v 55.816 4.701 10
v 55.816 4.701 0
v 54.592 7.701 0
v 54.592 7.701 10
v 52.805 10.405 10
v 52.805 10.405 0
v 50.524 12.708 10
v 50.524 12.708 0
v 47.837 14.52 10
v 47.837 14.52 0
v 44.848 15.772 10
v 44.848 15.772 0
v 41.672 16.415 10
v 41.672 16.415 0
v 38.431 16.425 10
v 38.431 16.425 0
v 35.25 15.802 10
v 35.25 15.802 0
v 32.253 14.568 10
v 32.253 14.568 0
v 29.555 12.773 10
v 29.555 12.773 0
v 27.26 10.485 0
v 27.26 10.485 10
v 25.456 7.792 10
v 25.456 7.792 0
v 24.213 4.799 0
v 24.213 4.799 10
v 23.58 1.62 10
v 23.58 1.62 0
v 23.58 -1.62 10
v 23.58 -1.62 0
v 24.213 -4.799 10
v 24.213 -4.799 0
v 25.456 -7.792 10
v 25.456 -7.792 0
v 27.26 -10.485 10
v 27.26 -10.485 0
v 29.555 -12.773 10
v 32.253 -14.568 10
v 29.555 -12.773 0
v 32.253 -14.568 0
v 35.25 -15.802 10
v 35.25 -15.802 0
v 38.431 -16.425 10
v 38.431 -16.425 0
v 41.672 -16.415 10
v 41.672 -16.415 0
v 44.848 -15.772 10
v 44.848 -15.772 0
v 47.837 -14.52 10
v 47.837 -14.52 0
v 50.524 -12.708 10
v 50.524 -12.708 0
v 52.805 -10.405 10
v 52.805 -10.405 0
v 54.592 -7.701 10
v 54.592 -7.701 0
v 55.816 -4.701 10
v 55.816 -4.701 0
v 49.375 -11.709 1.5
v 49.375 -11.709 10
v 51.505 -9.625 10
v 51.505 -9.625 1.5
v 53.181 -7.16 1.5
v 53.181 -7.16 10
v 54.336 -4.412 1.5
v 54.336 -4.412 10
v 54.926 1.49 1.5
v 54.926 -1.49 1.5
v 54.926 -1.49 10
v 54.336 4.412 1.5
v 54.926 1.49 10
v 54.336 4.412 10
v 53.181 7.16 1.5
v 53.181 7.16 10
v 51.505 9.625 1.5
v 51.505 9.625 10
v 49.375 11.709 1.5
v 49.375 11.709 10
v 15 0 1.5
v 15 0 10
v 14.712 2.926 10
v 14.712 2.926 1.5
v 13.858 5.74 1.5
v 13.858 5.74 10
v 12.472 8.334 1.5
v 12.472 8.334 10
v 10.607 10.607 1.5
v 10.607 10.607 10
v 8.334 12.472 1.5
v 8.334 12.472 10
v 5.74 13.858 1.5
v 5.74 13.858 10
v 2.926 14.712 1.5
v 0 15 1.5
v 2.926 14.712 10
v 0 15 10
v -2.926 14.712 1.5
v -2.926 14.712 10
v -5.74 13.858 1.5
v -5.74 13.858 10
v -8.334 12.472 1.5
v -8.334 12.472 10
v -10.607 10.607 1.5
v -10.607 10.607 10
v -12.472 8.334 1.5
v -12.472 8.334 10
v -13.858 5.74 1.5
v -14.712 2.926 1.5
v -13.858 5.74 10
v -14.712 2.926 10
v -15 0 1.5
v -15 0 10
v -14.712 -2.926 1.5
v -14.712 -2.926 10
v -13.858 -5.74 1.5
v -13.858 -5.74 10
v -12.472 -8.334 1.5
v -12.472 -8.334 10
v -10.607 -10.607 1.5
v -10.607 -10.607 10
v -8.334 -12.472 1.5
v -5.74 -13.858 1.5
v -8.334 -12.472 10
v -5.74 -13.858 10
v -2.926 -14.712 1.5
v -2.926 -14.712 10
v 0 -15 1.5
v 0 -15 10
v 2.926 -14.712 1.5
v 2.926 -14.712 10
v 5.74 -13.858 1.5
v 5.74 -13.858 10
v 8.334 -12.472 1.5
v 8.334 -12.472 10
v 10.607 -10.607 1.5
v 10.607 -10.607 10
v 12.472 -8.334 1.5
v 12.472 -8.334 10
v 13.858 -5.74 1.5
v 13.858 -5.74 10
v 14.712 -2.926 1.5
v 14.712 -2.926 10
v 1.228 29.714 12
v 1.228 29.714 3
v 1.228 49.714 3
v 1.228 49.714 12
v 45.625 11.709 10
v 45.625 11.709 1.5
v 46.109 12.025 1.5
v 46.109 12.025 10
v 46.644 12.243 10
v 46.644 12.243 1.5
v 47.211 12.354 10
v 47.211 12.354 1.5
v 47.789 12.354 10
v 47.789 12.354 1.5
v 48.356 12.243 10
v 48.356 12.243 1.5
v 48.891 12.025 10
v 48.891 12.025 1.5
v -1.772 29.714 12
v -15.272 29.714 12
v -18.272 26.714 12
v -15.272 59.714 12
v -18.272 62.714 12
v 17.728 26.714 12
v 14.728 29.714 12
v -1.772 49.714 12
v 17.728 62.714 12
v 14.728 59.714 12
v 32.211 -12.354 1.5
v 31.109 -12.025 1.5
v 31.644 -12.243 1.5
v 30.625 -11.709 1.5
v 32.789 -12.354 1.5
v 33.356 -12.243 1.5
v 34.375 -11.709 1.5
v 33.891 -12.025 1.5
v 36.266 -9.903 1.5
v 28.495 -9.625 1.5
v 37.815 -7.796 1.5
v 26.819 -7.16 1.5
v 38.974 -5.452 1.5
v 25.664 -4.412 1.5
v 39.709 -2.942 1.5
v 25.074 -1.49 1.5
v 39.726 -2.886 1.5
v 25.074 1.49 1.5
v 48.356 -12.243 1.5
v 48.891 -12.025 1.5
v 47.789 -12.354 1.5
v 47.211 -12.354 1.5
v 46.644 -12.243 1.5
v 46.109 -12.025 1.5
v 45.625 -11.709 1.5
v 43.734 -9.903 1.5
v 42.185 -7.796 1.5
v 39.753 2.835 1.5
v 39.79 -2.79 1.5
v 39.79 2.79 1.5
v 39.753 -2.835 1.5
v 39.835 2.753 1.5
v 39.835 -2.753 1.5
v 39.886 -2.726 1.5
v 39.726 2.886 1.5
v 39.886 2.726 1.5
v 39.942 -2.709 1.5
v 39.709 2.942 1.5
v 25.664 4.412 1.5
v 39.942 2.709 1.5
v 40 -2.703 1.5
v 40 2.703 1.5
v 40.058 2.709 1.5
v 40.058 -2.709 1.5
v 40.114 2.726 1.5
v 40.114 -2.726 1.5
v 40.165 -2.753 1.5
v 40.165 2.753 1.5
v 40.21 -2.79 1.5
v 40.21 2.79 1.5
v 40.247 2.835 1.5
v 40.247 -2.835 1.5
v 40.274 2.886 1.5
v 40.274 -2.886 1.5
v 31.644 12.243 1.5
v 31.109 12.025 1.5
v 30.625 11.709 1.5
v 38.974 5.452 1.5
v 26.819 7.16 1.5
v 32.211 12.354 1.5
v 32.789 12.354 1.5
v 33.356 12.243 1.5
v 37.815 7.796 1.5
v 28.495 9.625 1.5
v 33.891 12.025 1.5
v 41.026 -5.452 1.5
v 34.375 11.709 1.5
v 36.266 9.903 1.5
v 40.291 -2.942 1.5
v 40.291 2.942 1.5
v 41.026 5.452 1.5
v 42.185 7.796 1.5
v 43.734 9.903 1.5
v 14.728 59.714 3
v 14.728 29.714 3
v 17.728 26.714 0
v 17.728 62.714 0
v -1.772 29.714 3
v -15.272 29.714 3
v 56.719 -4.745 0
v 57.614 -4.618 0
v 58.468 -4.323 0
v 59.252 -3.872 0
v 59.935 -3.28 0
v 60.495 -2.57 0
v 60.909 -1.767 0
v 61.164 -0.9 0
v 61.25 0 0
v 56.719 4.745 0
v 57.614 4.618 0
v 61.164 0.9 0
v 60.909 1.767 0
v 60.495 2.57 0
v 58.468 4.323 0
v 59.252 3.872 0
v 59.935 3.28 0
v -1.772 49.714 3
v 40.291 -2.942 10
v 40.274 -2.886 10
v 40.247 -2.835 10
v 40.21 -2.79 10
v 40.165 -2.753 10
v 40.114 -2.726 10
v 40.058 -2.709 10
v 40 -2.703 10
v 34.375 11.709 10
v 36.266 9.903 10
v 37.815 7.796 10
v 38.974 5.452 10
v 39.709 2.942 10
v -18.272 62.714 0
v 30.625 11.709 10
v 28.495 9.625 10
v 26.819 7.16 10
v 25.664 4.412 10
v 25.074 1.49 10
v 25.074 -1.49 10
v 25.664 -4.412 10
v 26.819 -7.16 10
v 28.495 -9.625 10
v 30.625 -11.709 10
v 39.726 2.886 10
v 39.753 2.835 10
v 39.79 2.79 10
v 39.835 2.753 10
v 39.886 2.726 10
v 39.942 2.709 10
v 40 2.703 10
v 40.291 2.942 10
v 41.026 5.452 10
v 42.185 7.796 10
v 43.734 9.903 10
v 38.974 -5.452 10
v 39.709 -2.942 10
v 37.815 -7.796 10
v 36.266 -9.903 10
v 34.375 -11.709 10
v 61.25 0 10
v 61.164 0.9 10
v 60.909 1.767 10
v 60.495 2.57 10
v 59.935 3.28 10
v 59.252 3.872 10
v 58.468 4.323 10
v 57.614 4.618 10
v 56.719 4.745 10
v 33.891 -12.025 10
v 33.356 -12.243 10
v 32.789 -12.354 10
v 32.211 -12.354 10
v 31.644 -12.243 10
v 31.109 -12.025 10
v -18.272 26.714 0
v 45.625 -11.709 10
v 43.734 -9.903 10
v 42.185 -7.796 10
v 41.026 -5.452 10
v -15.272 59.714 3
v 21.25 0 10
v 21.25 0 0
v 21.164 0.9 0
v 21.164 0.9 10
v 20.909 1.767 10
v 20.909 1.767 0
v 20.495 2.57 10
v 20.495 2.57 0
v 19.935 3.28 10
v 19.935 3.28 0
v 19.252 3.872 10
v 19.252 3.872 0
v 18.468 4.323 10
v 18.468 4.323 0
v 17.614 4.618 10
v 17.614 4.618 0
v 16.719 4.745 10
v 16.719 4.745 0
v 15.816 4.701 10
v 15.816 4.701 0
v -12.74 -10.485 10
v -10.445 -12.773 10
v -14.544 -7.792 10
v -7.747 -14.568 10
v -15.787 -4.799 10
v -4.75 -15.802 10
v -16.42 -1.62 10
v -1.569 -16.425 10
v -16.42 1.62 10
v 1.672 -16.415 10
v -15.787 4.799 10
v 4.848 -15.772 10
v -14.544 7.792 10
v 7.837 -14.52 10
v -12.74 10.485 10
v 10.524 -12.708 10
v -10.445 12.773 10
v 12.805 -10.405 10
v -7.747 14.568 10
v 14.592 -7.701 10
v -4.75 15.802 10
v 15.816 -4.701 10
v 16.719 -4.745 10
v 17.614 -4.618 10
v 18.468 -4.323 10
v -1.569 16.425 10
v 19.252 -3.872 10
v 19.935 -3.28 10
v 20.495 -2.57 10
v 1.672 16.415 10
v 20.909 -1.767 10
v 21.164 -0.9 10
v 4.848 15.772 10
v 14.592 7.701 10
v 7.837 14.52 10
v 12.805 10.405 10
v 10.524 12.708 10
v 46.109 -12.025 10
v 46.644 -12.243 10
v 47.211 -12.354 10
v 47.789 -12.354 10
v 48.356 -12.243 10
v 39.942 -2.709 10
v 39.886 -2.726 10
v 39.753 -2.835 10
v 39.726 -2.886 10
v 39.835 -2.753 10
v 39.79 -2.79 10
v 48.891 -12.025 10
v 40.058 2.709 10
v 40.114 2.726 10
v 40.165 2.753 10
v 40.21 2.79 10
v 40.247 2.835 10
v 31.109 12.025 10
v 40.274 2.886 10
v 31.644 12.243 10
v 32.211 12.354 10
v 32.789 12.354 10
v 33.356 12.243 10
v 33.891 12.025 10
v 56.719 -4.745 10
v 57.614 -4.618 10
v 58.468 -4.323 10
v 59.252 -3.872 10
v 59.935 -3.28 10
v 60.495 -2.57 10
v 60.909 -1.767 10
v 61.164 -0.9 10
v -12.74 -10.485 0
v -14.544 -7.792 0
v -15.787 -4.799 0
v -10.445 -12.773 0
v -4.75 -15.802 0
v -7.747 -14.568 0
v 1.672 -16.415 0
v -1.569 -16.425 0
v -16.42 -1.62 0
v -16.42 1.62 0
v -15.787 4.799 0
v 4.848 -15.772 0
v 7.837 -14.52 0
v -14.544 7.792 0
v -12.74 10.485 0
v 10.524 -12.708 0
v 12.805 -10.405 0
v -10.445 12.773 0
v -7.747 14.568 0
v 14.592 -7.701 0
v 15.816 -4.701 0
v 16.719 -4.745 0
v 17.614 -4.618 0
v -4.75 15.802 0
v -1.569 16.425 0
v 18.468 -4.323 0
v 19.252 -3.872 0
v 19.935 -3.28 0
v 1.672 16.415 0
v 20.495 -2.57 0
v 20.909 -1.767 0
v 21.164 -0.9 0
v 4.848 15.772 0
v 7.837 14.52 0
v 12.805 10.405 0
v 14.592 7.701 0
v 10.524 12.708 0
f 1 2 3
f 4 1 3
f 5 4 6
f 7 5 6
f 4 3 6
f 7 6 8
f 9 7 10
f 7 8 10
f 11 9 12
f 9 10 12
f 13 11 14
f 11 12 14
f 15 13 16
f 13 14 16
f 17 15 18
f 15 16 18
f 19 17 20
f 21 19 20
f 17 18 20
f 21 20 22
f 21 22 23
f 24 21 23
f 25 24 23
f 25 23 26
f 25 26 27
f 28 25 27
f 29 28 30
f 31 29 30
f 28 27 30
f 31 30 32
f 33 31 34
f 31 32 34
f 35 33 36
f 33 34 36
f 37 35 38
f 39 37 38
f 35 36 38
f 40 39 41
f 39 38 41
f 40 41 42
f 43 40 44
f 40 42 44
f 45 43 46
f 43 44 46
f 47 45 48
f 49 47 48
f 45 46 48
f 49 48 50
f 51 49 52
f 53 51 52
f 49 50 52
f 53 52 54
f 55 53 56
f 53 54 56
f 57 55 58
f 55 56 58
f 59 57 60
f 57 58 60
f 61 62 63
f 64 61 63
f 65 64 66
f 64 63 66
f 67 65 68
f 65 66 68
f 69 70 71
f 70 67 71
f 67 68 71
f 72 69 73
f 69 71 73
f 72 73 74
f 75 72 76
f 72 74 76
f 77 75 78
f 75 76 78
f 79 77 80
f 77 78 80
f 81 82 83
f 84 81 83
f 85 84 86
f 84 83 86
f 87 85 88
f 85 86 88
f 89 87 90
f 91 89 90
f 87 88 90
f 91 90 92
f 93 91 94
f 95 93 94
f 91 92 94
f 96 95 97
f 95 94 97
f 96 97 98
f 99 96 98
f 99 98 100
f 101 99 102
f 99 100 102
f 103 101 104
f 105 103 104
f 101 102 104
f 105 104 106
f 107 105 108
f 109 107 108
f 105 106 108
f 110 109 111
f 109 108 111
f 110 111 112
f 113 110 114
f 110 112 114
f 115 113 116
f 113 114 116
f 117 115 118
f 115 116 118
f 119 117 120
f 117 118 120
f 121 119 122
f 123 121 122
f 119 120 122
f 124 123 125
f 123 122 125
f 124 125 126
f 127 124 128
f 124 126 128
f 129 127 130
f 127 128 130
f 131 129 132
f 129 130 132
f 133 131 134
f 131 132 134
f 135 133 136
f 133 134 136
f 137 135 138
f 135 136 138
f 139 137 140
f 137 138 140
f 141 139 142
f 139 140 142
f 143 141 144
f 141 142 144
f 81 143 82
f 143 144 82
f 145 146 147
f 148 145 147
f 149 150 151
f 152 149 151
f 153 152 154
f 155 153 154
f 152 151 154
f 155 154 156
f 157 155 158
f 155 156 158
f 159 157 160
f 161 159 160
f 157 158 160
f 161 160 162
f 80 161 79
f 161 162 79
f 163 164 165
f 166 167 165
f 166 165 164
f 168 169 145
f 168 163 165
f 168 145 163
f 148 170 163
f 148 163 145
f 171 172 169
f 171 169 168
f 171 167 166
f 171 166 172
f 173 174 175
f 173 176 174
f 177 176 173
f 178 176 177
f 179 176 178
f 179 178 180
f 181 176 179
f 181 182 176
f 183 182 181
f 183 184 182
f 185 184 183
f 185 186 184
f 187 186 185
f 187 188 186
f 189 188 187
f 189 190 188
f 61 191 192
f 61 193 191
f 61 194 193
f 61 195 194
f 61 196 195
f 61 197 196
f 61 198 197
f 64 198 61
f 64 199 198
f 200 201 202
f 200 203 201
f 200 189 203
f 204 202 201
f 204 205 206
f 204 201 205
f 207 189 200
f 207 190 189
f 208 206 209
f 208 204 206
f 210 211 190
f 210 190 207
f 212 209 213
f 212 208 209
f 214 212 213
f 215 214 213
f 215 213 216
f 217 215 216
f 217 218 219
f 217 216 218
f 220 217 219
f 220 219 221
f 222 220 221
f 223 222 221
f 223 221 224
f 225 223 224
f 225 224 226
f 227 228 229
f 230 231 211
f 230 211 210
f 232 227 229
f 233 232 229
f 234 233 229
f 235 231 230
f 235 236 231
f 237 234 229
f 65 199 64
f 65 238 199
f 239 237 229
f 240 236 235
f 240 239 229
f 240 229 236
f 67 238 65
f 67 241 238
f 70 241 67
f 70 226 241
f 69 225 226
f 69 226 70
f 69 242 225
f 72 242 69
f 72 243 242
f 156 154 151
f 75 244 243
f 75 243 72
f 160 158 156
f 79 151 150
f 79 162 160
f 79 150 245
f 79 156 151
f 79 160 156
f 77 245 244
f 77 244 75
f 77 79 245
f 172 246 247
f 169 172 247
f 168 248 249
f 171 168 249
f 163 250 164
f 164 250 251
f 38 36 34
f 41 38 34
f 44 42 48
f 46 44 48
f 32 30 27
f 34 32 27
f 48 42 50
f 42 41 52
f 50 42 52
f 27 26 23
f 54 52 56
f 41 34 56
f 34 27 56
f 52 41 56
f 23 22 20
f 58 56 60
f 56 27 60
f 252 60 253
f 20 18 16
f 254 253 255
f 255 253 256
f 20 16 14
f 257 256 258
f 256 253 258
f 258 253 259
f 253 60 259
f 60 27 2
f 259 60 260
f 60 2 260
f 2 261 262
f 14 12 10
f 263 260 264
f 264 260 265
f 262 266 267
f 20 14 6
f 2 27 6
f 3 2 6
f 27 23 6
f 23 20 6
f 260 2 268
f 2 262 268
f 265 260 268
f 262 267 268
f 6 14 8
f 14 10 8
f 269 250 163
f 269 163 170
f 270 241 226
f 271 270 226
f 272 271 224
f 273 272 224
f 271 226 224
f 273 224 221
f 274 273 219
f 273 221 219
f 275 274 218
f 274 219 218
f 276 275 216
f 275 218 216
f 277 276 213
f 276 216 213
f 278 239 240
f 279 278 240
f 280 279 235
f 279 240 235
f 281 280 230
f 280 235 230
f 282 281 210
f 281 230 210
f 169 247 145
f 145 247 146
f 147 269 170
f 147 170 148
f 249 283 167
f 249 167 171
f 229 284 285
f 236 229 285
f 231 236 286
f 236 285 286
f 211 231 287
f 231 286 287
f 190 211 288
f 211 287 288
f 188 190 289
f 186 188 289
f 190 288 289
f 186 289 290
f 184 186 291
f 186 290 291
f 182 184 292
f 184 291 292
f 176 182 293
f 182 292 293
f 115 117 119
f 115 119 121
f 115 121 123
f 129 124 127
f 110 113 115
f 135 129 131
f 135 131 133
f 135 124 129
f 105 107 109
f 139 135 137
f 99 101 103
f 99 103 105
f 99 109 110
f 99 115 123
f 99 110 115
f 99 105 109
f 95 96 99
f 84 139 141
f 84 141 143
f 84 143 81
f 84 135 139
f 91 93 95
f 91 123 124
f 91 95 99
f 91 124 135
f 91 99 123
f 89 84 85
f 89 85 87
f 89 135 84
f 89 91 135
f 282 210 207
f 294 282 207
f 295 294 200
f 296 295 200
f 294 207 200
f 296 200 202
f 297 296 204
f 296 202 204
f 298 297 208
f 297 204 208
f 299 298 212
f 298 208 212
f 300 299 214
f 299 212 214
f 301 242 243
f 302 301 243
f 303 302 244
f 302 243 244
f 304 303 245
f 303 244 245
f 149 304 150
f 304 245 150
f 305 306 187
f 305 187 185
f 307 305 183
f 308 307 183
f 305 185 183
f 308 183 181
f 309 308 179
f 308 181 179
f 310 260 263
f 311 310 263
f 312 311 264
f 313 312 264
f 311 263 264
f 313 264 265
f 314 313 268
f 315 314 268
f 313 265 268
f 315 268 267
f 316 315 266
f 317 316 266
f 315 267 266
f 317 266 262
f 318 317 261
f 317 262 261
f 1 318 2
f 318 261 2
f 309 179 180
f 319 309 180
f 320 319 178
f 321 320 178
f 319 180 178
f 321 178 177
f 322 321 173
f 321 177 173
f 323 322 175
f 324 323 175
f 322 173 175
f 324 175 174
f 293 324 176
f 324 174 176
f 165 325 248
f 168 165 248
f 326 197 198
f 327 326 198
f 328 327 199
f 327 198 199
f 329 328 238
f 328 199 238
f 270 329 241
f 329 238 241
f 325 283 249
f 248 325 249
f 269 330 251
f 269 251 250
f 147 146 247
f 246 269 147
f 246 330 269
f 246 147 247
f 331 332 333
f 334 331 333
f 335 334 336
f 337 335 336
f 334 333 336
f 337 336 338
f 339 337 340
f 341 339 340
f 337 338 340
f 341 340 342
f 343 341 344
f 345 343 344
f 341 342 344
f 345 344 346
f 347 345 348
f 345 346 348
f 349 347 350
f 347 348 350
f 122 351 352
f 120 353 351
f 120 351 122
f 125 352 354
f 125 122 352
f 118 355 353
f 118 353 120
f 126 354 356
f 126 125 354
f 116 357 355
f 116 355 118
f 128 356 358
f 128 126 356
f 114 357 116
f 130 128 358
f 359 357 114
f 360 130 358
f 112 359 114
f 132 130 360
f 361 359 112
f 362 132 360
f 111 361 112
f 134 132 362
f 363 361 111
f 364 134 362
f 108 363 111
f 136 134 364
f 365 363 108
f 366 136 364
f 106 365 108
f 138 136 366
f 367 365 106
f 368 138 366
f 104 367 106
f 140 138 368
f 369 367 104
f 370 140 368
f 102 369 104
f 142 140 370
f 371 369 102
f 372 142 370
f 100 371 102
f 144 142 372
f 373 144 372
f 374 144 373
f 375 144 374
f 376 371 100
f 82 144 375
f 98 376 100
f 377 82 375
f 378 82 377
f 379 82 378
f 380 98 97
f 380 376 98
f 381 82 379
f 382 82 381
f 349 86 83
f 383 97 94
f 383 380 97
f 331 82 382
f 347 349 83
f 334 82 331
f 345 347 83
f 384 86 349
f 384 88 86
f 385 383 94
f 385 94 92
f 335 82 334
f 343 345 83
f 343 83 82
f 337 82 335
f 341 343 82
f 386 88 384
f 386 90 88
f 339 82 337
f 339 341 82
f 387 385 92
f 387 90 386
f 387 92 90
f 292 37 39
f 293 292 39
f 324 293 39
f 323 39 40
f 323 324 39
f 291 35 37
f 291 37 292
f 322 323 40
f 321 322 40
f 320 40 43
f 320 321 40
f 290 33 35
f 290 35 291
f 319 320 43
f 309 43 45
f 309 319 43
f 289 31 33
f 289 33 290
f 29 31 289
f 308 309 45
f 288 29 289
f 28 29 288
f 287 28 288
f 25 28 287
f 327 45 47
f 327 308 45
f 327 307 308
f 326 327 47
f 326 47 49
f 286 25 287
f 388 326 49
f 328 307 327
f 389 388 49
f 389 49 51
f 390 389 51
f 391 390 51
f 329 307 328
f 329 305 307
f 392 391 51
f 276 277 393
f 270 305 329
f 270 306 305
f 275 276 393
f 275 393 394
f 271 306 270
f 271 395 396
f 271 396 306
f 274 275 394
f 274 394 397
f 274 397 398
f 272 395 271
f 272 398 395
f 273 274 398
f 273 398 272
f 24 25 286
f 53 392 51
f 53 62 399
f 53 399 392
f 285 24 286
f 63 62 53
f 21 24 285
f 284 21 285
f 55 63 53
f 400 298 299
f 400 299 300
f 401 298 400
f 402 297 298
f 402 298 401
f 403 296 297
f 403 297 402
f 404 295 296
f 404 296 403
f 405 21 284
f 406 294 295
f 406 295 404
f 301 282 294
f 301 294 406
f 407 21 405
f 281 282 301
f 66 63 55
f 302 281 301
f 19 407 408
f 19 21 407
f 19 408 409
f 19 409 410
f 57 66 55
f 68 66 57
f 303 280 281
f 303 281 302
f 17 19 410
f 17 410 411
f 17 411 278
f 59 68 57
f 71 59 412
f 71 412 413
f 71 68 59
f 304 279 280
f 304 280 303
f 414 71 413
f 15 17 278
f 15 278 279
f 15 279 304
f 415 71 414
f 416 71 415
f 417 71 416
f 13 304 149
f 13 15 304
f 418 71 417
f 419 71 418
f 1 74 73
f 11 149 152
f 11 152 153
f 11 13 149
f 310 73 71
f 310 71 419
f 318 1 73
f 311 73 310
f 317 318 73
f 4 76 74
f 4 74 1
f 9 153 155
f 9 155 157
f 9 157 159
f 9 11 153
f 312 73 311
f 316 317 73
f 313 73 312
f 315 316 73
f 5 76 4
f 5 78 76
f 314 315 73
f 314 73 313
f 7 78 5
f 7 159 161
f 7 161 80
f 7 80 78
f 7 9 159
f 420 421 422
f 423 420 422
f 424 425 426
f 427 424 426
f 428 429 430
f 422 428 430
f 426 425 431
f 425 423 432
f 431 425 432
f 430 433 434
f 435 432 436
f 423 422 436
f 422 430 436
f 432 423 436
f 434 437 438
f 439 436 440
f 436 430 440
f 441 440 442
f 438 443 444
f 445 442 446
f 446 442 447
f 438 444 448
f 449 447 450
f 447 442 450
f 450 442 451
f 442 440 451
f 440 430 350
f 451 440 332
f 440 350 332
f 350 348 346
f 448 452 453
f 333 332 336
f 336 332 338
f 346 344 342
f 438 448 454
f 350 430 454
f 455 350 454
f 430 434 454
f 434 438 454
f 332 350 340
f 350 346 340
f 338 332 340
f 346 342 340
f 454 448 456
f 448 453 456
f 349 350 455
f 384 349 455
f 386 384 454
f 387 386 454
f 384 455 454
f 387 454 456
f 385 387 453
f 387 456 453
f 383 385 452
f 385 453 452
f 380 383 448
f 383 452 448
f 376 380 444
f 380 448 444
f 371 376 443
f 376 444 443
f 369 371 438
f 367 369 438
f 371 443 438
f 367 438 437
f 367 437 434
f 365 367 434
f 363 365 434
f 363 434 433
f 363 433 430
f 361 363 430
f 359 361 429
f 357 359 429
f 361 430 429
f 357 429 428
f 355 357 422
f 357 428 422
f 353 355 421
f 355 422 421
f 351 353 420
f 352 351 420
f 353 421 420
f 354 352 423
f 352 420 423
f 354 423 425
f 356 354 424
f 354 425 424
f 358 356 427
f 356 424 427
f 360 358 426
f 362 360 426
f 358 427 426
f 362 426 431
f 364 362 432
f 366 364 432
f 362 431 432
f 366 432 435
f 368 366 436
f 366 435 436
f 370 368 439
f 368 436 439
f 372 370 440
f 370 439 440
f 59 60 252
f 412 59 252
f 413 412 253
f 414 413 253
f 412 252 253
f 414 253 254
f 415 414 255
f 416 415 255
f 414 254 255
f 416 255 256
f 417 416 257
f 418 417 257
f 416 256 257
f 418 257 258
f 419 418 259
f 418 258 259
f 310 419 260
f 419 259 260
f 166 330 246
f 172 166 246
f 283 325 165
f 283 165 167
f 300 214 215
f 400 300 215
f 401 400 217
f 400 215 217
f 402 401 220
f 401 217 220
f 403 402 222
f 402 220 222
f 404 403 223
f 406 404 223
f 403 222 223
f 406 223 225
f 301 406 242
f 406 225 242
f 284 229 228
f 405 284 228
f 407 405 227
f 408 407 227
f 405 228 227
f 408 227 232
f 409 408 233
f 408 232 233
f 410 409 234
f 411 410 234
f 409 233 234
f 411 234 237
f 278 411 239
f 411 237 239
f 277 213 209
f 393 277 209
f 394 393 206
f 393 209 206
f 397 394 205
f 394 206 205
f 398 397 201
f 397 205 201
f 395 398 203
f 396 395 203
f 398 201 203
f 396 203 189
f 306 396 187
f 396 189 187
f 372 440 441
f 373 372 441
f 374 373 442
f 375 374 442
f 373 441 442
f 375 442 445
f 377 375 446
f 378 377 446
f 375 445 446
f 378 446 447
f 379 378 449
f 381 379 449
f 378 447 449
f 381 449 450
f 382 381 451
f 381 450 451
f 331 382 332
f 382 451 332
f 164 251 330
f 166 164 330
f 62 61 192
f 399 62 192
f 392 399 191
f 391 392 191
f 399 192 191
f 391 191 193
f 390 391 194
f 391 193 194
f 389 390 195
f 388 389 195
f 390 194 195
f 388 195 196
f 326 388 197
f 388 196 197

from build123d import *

# Parameters (mm, degrees)
F1_DEPTH  = 10
F3_R      = 15
F4_DEPTH  = 8.5
F7_DEPTH  = 8.5
F8_W      = 36
F8_H      = 36
F8_W_2    = 3
F8_H_2    = 20
F9_DEPTH  = 12
F10_DEPTH = 3


with BuildPart() as f1:
    # F0 (on Top) → F1 (new body)
    with BuildSketch(Plane.XY):
        with BuildLine():
            ThreePointArc((15.8162878788, -4.7005358987), (16.3281773325, -2.375), (16.5, 0))
            ThreePointArc((16.5, 0), (16.3281773325, 2.375), (15.8162878788, 4.7005358987))
            ThreePointArc((15.8162878788, 4.7005358987), (11.75, 0), (15.8162878788, -4.7005358987))
        make_face()
        with BuildLine():
            ThreePointArc((15.8162878788, 4.7005358987), (16.3281773325, 2.375), (16.5, 0))
            ThreePointArc((16.5, 0), (16.3281773325, -2.375), (15.8162878788, -4.7005358987))
            ThreePointArc((15.8162878788, -4.7005358987), (19.6076411814, -3.5923622156), (21.25, 0))
            ThreePointArc((21.25, 0), (19.6076411814, 3.5923622156), (15.8162878788, 4.7005358987))
        make_face()
        with BuildLine():
            ThreePointArc((15.8162878788, -4.7005358987), (11.75, 0), (15.8162878788, 4.7005358987))
            ThreePointArc((15.8162878788, 4.7005358987), (-16.5, 0), (15.8162878788, -4.7005358987))
        make_face()
    extrude(amount=F1_DEPTH)

    # F3 (on face) → F4 (cut, through all)
    with BuildSketch(Plane.XY.offset(10)):
        Circle(F3_R)
    extrude(amount=-F4_DEPTH, mode=Mode.SUBTRACT)


with BuildPart() as f5_1:
    # F5: copy of F1
    add(f1.part.moved(Location((40, 0, 0))))

    # F6 (on face) → F7 (join, through all)
    with BuildSketch(Plane.XY.offset(1.5)):
        with BuildLine():
            ThreePointArc((34.375, 11.709371247), (37.8149952792, 7.7958896859), (39.7087101354, 2.9417420271))
            ThreePointArc((39.7087101354, 2.9417420271), (39.8116681808, 2.770272112), (40, 2.7029414592))
            ThreePointArc((40, 2.7029414592), (40.1883318192, 2.770272112), (40.2912898646, 2.9417420271))
            ThreePointArc((40.2912898646, 2.9417420271), (42.1850047208, 7.7958896859), (45.625, 11.709371247))
            ThreePointArc((45.625, 11.709371247), (47.5, 12.3674969976), (49.375, 11.709371247))
            ThreePointArc((49.375, 11.709371247), (40, 15), (30.625, 11.709371247))
            ThreePointArc((30.625, 11.709371247), (32.5, 12.3674969976), (34.375, 11.709371247))
        make_face()
        with BuildLine():
            ThreePointArc((34.375, -11.709371247), (32.5, -12.3674969976), (30.625, -11.709371247))
            ThreePointArc((30.625, -11.709371247), (40, -15), (49.375, -11.709371247))
            ThreePointArc((49.375, -11.709371247), (47.5, -12.3674969976), (45.625, -11.709371247))
            ThreePointArc((45.625, -11.709371247), (42.1850047208, -7.7958896859), (40.2912898646, -2.9417420271))
            ThreePointArc((40.2912898646, -2.9417420271), (40.1883318192, -2.770272112), (40, -2.7029414592))
            ThreePointArc((40, -2.7029414592), (39.8116681808, -2.770272112), (39.7087101354, -2.9417420271))
            ThreePointArc((39.7087101354, -2.9417420271), (37.8149952792, -7.7958896859), (34.375, -11.709371247))
        make_face()
    extrude(amount=F7_DEPTH)


with BuildPart() as f9:
    # F8 (on Top) → F9 (new body)
    with BuildSketch(Plane.XY):
        with Locations((-0.2718451433, 44.7135615996)):
            Rectangle(F8_W, F8_H)
        Polygon((-15.2718451433, 29.7135615996), (-15.2718451433, 59.7135615996), (14.7281548567, 59.7135615996), (14.7281548567, 29.7135615996), (1.2281548567, 29.7135615996), (-1.7718451433, 29.7135615996), align=None, mode=Mode.SUBTRACT)
        with Locations((-0.2718451433, 39.7135615996)):
            Rectangle(F8_W_2, F8_H_2)
    extrude(amount=F9_DEPTH)

    # F8 (on Top) → F10 (join)
    with BuildSketch(Plane.XY):
        Polygon((14.7281548567, 59.7135615996), (-15.2718451433, 59.7135615996), (-15.2718451433, 29.7135615996), (-1.7718451433, 29.7135615996), (-1.7718451433, 49.7135615996), (1.2281548567, 49.7135615996), (1.2281548567, 29.7135615996), (14.7281548567, 29.7135615996), align=None)
    extrude(amount=F10_DEPTH)


solid = Compound([f1.part, f5_1.part, f9.part])
